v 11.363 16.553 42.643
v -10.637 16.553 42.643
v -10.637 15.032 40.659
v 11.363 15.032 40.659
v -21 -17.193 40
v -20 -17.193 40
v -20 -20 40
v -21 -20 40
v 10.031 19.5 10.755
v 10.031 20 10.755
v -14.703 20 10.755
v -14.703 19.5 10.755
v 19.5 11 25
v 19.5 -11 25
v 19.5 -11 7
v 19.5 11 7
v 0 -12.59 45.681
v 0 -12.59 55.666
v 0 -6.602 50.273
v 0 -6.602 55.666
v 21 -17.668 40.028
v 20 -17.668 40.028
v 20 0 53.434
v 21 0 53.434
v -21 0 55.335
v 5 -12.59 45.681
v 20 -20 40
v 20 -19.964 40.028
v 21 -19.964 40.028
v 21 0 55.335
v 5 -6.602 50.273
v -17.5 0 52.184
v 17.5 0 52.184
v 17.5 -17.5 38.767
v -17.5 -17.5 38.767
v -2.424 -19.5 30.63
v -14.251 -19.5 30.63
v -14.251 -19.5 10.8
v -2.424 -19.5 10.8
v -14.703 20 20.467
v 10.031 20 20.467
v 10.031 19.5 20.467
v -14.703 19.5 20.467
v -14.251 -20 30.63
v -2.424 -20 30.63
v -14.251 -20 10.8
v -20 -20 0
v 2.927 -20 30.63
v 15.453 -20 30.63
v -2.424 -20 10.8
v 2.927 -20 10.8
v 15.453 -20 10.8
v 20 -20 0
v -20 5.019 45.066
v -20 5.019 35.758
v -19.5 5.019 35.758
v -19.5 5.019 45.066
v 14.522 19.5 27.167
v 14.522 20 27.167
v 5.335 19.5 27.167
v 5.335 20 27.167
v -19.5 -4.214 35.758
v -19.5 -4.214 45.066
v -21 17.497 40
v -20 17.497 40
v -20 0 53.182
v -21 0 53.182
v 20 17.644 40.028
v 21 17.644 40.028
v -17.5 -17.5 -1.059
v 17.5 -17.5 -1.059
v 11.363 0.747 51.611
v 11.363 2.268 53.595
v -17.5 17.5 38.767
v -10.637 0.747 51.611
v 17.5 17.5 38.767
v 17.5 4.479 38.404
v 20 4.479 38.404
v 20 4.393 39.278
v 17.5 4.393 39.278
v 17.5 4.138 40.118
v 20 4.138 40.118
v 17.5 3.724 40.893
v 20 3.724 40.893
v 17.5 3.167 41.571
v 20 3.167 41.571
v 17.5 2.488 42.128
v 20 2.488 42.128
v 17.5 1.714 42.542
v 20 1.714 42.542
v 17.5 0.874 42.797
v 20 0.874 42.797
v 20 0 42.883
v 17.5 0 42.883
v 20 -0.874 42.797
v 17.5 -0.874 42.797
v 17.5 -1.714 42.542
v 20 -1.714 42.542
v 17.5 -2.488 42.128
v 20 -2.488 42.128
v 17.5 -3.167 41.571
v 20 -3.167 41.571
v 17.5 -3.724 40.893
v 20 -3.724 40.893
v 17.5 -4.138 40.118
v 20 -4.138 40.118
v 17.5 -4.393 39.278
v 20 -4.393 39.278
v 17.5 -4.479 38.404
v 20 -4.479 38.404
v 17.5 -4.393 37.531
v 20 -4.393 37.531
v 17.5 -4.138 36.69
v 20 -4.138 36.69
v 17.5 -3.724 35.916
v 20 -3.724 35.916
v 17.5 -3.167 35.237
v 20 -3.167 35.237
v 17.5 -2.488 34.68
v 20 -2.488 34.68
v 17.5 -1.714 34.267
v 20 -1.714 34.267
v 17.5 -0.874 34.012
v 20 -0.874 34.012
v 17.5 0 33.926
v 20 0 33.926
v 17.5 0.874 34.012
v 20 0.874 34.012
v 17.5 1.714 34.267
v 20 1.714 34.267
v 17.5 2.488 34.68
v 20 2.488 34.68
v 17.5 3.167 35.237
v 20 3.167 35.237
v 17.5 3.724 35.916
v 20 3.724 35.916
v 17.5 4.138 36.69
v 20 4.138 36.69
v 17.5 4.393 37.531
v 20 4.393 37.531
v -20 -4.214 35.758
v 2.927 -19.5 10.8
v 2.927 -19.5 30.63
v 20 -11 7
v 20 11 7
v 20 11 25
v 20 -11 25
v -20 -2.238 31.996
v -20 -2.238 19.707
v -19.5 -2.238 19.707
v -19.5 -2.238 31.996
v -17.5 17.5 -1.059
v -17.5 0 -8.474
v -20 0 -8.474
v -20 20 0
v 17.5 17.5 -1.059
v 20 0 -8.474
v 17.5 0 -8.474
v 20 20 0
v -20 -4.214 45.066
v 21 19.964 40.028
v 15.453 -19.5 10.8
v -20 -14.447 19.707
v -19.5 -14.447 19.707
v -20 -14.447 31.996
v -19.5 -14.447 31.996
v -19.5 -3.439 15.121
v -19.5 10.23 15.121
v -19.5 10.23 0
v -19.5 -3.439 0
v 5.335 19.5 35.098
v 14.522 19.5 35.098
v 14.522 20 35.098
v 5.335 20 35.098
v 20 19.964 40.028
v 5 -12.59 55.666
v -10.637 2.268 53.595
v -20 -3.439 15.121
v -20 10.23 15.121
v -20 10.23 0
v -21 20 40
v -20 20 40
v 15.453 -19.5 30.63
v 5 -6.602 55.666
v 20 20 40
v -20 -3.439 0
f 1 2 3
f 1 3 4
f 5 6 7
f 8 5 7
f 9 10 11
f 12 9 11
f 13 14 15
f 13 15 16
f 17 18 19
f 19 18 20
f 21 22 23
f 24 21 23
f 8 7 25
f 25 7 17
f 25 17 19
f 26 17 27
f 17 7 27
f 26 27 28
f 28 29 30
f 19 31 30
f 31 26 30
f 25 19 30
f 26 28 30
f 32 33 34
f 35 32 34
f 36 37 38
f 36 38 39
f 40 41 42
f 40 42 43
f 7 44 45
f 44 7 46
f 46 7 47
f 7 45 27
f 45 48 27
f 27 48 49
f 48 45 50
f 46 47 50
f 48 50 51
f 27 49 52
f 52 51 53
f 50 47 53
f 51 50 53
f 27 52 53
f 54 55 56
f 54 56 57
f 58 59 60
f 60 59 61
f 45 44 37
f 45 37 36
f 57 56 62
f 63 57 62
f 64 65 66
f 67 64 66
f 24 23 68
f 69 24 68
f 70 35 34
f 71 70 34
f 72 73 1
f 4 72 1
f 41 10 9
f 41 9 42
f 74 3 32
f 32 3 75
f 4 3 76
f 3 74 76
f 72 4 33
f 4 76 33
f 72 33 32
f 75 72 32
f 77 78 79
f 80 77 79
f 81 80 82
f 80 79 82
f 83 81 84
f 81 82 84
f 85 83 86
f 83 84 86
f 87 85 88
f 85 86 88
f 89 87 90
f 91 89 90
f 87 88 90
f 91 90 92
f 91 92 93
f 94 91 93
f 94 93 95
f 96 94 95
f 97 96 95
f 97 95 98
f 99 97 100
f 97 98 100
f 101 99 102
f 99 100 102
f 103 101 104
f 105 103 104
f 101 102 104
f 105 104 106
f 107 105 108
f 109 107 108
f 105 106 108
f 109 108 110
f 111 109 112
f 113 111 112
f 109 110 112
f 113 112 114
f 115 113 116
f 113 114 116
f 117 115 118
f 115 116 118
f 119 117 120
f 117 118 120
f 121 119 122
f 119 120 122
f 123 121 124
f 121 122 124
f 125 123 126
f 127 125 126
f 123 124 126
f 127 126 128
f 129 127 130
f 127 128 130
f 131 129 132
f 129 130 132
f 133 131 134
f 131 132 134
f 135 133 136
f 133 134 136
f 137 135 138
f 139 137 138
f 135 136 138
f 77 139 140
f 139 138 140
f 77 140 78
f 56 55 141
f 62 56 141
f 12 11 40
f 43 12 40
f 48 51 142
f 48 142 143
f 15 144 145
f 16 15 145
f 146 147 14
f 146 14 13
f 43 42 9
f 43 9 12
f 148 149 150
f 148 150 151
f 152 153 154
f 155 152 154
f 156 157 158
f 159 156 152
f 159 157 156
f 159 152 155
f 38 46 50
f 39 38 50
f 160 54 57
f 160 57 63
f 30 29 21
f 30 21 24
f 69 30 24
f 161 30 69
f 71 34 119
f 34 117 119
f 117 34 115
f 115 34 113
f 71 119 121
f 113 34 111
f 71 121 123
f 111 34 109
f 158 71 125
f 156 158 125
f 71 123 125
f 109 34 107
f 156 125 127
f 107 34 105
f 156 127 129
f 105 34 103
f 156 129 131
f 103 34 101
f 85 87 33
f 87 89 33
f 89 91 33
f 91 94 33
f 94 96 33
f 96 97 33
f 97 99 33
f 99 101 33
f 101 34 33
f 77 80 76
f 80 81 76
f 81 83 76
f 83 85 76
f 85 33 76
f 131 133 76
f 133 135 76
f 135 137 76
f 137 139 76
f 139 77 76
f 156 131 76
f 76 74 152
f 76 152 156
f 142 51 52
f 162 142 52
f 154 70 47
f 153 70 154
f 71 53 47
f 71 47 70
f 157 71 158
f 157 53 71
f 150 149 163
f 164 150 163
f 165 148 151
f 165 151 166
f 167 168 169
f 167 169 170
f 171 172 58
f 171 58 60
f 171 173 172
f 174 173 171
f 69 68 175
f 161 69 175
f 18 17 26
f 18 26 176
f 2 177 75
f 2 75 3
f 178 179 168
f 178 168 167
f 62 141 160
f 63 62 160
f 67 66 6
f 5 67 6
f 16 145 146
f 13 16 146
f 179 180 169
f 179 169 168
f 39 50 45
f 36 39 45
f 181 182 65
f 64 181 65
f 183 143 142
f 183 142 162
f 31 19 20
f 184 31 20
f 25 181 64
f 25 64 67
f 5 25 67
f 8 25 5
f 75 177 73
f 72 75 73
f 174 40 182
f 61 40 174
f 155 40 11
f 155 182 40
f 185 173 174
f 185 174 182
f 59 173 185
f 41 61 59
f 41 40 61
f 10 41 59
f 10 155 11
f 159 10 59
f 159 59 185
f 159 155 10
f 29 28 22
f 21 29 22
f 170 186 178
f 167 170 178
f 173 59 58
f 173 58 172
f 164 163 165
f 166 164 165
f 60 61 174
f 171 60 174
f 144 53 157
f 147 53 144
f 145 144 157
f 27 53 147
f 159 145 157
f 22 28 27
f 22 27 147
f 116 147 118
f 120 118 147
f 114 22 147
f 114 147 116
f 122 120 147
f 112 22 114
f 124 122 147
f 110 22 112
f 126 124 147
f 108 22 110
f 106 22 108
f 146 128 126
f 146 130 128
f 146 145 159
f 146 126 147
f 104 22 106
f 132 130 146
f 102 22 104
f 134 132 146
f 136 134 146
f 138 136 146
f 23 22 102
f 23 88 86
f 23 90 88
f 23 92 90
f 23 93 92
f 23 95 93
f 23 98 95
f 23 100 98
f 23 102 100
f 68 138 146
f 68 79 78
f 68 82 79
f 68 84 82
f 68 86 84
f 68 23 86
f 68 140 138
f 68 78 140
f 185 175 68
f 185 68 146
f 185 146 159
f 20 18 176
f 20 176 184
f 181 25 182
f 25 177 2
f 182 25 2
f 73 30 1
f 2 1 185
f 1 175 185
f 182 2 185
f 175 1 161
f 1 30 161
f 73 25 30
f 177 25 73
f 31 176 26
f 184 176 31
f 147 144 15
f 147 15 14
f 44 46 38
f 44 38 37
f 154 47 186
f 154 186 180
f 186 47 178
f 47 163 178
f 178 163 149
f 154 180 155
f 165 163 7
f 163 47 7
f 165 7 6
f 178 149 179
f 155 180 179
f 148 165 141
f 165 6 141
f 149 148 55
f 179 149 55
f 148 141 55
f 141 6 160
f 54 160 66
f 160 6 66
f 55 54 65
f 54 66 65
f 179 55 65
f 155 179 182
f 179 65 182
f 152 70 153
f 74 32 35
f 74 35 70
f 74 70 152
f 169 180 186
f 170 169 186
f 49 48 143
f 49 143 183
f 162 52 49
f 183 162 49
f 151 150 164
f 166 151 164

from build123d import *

# Parameters (mm, degrees)
F1_W      = 40
F1_H      = 40
F2_DEPTH  = 40
F5_DEPTH  = 40
F6_T      = -2.5
F4_W      = 22
F4_H      = 18
F7_DEPTH  = 0.5
F8_DEPTH  = 40
F9_W      = 35
F9_H      = 35
F10_DEPTH = 25
F11_W     = 22
F11_H     = 18
F12_DEPTH = 2.5
F13_W     = 5.9888265096
F13_H     = 10.6466971338
F14_DEPTH = 5
F15_DEPTH = 5
F17_DEPTH = 1
F18_W     = 9.2321382836
F18_H     = 9.3079488724
F18_W_2   = 12.2083812021
F18_H_2   = 12.2888814658
F18_W_3   = 13.6692405213
F18_H_3   = 15.1209759388
F19_DEPTH = 0.5
F20_DEPTH = 1
F21_W     = 9.1872019693
F21_H     = 7.9310182482
F21_W_2   = 24.7337101027
F21_H_2   = 9.711895138
F22_DEPTH = 0.5
F23_W     = 11.8269838858
F23_H     = 19.8296736926
F23_W_2   = 12.5252173748
F24_DEPTH = 0.5
F16_R     = 4.4787293466
F25_DEPTH = 2.5


with BuildPart() as f2:
    # F1 (on Top) → F2 (new body)
    with BuildSketch(Plane.XY):
        Rectangle(F1_W, F1_H)
    extrude(amount=F2_DEPTH)

    # F3 (on face) → F5 (join)
    with BuildSketch(Plane.YZ.offset(20)):
        Polygon((0, 55.334508419), (-20, 40), (20, 40), align=None)
    extrude(amount=-F5_DEPTH)

    # F6
    f6_openings = [f2.faces().sort_by_distance(p)[0] for p in [
        (0, 0, 0),
    ]]
    offset(amount=F6_T, openings=f6_openings)

    # F4 (on face) → F7 (cut)
    with BuildSketch(Plane.YZ.offset(20)):
        with Locations((0, 16)):
            Rectangle(F4_W, F4_H)
    extrude(amount=-F7_DEPTH, mode=Mode.SUBTRACT)

    # F3 (on face) → F8 (join)
    with BuildSketch(Plane.YZ.offset(20)):
        Polygon((20, 0), (-20, 0), (0, -8.4736328572), align=None)
    extrude(amount=-F8_DEPTH)

    # F9 (on Top) → F10 (cut)
    with BuildSketch(Plane.XY):
        Rectangle(F9_W, F9_H)
    extrude(amount=-F10_DEPTH, mode=Mode.SUBTRACT)

    # F11 (on face) → F12 (cut)
    with BuildSketch(Plane(origin=(0, 26.7190835157, 34.848307863), x_dir=(1, 0, 0), z_dir=(0, 0.6084609091, 0.7935838469))):
        with Locations((0.3634039909, -21.8104213327)):
            Rectangle(F11_W, F11_H)
    extrude(amount=-F12_DEPTH, mode=Mode.SUBTRACT)

    # F13 (on Right) → F14 (join)
    with BuildSketch(Plane.YZ):
        with Locations((-9.5960779581, 50.3422562033)):
            Rectangle(F13_W, F13_H)
    extrude(amount=F14_DEPTH)

    # F15 (cut): a face of the model
    f15_faces = [f2.faces().sort_by_distance(p)[0] for p in [
        (5, -7.5162341361, 45.7201312697),
    ]]
    extrude(f15_faces, amount=-F15_DEPTH, mode=Mode.SUBTRACT)

    # F16 (on face) → F17 (join)
    with BuildSketch(Plane.YZ.offset(20)):
        Polygon((0, 55.334508419), (-19.9640467717, 40.0275662541), (-17.6681634039, 40.0275662541), (0, 53.4335300326), (17.6441799849, 40.0275662541), (19.9640467717, 40.0275662541), align=None)
    extrude(amount=F17_DEPTH)

    # F18 (on face) → F19 (cut)
    with BuildSketch(Plane(origin=(-20, 0, 0), x_dir=(0, -1, 0), z_dir=(-1, 0, 0))):
        with Locations((-0.4024395021, 40.4120413586)):
            Rectangle(F18_W, F18_H)
        with Locations((8.3425419871, 25.8511127904)):
            Rectangle(F18_W_2, F18_H_2)
        with Locations((-3.3955307445, 7.5604879694)):
            Rectangle(F18_W_3, F18_H_3)
    extrude(amount=-F19_DEPTH, mode=Mode.SUBTRACT)

    # F18 (on face) → F20 (join)
    with BuildSketch(Plane(origin=(-20, 0, 0), x_dir=(0, -1, 0), z_dir=(-1, 0, 0))):
        Polygon((0, 55.334508419), (-20, 40), (-17.4968317151, 40), (0, 53.1819947064), (17.1925885671, 40), (20, 40), align=None)
    extrude(amount=F20_DEPTH)

    # F21 (on face) → F22 (cut)
    with BuildSketch(Plane(origin=(0, 20, 0), x_dir=(-1, 0, 0), z_dir=(0, 1, 0))):
        with Locations((-9.9281030707, 31.1322165653)):
            Rectangle(F21_W, F21_H)
        with Locations((2.3357556202, 15.6106483191)):
            Rectangle(F21_W_2, F21_H_2)
    extrude(amount=-F22_DEPTH, mode=Mode.SUBTRACT)

    # F23 (on face) → F24 (cut)
    with BuildSketch(Plane.XZ.offset(20)):
        with Locations((-8.3377951523, 20.714933984)):
            Rectangle(F23_W, F23_H)
        with Locations((9.1900789412, 20.714933984)):
            Rectangle(F23_W_2, F23_H)
    extrude(amount=-F24_DEPTH, mode=Mode.SUBTRACT)

    # F16 (on face) → F25 (cut)
    with BuildSketch(Plane.YZ.offset(20)):
        with Locations((0, 38.4044200182)):
            Circle(F16_R)
    extrude(amount=-F25_DEPTH, mode=Mode.SUBTRACT)


solid = f2.part
